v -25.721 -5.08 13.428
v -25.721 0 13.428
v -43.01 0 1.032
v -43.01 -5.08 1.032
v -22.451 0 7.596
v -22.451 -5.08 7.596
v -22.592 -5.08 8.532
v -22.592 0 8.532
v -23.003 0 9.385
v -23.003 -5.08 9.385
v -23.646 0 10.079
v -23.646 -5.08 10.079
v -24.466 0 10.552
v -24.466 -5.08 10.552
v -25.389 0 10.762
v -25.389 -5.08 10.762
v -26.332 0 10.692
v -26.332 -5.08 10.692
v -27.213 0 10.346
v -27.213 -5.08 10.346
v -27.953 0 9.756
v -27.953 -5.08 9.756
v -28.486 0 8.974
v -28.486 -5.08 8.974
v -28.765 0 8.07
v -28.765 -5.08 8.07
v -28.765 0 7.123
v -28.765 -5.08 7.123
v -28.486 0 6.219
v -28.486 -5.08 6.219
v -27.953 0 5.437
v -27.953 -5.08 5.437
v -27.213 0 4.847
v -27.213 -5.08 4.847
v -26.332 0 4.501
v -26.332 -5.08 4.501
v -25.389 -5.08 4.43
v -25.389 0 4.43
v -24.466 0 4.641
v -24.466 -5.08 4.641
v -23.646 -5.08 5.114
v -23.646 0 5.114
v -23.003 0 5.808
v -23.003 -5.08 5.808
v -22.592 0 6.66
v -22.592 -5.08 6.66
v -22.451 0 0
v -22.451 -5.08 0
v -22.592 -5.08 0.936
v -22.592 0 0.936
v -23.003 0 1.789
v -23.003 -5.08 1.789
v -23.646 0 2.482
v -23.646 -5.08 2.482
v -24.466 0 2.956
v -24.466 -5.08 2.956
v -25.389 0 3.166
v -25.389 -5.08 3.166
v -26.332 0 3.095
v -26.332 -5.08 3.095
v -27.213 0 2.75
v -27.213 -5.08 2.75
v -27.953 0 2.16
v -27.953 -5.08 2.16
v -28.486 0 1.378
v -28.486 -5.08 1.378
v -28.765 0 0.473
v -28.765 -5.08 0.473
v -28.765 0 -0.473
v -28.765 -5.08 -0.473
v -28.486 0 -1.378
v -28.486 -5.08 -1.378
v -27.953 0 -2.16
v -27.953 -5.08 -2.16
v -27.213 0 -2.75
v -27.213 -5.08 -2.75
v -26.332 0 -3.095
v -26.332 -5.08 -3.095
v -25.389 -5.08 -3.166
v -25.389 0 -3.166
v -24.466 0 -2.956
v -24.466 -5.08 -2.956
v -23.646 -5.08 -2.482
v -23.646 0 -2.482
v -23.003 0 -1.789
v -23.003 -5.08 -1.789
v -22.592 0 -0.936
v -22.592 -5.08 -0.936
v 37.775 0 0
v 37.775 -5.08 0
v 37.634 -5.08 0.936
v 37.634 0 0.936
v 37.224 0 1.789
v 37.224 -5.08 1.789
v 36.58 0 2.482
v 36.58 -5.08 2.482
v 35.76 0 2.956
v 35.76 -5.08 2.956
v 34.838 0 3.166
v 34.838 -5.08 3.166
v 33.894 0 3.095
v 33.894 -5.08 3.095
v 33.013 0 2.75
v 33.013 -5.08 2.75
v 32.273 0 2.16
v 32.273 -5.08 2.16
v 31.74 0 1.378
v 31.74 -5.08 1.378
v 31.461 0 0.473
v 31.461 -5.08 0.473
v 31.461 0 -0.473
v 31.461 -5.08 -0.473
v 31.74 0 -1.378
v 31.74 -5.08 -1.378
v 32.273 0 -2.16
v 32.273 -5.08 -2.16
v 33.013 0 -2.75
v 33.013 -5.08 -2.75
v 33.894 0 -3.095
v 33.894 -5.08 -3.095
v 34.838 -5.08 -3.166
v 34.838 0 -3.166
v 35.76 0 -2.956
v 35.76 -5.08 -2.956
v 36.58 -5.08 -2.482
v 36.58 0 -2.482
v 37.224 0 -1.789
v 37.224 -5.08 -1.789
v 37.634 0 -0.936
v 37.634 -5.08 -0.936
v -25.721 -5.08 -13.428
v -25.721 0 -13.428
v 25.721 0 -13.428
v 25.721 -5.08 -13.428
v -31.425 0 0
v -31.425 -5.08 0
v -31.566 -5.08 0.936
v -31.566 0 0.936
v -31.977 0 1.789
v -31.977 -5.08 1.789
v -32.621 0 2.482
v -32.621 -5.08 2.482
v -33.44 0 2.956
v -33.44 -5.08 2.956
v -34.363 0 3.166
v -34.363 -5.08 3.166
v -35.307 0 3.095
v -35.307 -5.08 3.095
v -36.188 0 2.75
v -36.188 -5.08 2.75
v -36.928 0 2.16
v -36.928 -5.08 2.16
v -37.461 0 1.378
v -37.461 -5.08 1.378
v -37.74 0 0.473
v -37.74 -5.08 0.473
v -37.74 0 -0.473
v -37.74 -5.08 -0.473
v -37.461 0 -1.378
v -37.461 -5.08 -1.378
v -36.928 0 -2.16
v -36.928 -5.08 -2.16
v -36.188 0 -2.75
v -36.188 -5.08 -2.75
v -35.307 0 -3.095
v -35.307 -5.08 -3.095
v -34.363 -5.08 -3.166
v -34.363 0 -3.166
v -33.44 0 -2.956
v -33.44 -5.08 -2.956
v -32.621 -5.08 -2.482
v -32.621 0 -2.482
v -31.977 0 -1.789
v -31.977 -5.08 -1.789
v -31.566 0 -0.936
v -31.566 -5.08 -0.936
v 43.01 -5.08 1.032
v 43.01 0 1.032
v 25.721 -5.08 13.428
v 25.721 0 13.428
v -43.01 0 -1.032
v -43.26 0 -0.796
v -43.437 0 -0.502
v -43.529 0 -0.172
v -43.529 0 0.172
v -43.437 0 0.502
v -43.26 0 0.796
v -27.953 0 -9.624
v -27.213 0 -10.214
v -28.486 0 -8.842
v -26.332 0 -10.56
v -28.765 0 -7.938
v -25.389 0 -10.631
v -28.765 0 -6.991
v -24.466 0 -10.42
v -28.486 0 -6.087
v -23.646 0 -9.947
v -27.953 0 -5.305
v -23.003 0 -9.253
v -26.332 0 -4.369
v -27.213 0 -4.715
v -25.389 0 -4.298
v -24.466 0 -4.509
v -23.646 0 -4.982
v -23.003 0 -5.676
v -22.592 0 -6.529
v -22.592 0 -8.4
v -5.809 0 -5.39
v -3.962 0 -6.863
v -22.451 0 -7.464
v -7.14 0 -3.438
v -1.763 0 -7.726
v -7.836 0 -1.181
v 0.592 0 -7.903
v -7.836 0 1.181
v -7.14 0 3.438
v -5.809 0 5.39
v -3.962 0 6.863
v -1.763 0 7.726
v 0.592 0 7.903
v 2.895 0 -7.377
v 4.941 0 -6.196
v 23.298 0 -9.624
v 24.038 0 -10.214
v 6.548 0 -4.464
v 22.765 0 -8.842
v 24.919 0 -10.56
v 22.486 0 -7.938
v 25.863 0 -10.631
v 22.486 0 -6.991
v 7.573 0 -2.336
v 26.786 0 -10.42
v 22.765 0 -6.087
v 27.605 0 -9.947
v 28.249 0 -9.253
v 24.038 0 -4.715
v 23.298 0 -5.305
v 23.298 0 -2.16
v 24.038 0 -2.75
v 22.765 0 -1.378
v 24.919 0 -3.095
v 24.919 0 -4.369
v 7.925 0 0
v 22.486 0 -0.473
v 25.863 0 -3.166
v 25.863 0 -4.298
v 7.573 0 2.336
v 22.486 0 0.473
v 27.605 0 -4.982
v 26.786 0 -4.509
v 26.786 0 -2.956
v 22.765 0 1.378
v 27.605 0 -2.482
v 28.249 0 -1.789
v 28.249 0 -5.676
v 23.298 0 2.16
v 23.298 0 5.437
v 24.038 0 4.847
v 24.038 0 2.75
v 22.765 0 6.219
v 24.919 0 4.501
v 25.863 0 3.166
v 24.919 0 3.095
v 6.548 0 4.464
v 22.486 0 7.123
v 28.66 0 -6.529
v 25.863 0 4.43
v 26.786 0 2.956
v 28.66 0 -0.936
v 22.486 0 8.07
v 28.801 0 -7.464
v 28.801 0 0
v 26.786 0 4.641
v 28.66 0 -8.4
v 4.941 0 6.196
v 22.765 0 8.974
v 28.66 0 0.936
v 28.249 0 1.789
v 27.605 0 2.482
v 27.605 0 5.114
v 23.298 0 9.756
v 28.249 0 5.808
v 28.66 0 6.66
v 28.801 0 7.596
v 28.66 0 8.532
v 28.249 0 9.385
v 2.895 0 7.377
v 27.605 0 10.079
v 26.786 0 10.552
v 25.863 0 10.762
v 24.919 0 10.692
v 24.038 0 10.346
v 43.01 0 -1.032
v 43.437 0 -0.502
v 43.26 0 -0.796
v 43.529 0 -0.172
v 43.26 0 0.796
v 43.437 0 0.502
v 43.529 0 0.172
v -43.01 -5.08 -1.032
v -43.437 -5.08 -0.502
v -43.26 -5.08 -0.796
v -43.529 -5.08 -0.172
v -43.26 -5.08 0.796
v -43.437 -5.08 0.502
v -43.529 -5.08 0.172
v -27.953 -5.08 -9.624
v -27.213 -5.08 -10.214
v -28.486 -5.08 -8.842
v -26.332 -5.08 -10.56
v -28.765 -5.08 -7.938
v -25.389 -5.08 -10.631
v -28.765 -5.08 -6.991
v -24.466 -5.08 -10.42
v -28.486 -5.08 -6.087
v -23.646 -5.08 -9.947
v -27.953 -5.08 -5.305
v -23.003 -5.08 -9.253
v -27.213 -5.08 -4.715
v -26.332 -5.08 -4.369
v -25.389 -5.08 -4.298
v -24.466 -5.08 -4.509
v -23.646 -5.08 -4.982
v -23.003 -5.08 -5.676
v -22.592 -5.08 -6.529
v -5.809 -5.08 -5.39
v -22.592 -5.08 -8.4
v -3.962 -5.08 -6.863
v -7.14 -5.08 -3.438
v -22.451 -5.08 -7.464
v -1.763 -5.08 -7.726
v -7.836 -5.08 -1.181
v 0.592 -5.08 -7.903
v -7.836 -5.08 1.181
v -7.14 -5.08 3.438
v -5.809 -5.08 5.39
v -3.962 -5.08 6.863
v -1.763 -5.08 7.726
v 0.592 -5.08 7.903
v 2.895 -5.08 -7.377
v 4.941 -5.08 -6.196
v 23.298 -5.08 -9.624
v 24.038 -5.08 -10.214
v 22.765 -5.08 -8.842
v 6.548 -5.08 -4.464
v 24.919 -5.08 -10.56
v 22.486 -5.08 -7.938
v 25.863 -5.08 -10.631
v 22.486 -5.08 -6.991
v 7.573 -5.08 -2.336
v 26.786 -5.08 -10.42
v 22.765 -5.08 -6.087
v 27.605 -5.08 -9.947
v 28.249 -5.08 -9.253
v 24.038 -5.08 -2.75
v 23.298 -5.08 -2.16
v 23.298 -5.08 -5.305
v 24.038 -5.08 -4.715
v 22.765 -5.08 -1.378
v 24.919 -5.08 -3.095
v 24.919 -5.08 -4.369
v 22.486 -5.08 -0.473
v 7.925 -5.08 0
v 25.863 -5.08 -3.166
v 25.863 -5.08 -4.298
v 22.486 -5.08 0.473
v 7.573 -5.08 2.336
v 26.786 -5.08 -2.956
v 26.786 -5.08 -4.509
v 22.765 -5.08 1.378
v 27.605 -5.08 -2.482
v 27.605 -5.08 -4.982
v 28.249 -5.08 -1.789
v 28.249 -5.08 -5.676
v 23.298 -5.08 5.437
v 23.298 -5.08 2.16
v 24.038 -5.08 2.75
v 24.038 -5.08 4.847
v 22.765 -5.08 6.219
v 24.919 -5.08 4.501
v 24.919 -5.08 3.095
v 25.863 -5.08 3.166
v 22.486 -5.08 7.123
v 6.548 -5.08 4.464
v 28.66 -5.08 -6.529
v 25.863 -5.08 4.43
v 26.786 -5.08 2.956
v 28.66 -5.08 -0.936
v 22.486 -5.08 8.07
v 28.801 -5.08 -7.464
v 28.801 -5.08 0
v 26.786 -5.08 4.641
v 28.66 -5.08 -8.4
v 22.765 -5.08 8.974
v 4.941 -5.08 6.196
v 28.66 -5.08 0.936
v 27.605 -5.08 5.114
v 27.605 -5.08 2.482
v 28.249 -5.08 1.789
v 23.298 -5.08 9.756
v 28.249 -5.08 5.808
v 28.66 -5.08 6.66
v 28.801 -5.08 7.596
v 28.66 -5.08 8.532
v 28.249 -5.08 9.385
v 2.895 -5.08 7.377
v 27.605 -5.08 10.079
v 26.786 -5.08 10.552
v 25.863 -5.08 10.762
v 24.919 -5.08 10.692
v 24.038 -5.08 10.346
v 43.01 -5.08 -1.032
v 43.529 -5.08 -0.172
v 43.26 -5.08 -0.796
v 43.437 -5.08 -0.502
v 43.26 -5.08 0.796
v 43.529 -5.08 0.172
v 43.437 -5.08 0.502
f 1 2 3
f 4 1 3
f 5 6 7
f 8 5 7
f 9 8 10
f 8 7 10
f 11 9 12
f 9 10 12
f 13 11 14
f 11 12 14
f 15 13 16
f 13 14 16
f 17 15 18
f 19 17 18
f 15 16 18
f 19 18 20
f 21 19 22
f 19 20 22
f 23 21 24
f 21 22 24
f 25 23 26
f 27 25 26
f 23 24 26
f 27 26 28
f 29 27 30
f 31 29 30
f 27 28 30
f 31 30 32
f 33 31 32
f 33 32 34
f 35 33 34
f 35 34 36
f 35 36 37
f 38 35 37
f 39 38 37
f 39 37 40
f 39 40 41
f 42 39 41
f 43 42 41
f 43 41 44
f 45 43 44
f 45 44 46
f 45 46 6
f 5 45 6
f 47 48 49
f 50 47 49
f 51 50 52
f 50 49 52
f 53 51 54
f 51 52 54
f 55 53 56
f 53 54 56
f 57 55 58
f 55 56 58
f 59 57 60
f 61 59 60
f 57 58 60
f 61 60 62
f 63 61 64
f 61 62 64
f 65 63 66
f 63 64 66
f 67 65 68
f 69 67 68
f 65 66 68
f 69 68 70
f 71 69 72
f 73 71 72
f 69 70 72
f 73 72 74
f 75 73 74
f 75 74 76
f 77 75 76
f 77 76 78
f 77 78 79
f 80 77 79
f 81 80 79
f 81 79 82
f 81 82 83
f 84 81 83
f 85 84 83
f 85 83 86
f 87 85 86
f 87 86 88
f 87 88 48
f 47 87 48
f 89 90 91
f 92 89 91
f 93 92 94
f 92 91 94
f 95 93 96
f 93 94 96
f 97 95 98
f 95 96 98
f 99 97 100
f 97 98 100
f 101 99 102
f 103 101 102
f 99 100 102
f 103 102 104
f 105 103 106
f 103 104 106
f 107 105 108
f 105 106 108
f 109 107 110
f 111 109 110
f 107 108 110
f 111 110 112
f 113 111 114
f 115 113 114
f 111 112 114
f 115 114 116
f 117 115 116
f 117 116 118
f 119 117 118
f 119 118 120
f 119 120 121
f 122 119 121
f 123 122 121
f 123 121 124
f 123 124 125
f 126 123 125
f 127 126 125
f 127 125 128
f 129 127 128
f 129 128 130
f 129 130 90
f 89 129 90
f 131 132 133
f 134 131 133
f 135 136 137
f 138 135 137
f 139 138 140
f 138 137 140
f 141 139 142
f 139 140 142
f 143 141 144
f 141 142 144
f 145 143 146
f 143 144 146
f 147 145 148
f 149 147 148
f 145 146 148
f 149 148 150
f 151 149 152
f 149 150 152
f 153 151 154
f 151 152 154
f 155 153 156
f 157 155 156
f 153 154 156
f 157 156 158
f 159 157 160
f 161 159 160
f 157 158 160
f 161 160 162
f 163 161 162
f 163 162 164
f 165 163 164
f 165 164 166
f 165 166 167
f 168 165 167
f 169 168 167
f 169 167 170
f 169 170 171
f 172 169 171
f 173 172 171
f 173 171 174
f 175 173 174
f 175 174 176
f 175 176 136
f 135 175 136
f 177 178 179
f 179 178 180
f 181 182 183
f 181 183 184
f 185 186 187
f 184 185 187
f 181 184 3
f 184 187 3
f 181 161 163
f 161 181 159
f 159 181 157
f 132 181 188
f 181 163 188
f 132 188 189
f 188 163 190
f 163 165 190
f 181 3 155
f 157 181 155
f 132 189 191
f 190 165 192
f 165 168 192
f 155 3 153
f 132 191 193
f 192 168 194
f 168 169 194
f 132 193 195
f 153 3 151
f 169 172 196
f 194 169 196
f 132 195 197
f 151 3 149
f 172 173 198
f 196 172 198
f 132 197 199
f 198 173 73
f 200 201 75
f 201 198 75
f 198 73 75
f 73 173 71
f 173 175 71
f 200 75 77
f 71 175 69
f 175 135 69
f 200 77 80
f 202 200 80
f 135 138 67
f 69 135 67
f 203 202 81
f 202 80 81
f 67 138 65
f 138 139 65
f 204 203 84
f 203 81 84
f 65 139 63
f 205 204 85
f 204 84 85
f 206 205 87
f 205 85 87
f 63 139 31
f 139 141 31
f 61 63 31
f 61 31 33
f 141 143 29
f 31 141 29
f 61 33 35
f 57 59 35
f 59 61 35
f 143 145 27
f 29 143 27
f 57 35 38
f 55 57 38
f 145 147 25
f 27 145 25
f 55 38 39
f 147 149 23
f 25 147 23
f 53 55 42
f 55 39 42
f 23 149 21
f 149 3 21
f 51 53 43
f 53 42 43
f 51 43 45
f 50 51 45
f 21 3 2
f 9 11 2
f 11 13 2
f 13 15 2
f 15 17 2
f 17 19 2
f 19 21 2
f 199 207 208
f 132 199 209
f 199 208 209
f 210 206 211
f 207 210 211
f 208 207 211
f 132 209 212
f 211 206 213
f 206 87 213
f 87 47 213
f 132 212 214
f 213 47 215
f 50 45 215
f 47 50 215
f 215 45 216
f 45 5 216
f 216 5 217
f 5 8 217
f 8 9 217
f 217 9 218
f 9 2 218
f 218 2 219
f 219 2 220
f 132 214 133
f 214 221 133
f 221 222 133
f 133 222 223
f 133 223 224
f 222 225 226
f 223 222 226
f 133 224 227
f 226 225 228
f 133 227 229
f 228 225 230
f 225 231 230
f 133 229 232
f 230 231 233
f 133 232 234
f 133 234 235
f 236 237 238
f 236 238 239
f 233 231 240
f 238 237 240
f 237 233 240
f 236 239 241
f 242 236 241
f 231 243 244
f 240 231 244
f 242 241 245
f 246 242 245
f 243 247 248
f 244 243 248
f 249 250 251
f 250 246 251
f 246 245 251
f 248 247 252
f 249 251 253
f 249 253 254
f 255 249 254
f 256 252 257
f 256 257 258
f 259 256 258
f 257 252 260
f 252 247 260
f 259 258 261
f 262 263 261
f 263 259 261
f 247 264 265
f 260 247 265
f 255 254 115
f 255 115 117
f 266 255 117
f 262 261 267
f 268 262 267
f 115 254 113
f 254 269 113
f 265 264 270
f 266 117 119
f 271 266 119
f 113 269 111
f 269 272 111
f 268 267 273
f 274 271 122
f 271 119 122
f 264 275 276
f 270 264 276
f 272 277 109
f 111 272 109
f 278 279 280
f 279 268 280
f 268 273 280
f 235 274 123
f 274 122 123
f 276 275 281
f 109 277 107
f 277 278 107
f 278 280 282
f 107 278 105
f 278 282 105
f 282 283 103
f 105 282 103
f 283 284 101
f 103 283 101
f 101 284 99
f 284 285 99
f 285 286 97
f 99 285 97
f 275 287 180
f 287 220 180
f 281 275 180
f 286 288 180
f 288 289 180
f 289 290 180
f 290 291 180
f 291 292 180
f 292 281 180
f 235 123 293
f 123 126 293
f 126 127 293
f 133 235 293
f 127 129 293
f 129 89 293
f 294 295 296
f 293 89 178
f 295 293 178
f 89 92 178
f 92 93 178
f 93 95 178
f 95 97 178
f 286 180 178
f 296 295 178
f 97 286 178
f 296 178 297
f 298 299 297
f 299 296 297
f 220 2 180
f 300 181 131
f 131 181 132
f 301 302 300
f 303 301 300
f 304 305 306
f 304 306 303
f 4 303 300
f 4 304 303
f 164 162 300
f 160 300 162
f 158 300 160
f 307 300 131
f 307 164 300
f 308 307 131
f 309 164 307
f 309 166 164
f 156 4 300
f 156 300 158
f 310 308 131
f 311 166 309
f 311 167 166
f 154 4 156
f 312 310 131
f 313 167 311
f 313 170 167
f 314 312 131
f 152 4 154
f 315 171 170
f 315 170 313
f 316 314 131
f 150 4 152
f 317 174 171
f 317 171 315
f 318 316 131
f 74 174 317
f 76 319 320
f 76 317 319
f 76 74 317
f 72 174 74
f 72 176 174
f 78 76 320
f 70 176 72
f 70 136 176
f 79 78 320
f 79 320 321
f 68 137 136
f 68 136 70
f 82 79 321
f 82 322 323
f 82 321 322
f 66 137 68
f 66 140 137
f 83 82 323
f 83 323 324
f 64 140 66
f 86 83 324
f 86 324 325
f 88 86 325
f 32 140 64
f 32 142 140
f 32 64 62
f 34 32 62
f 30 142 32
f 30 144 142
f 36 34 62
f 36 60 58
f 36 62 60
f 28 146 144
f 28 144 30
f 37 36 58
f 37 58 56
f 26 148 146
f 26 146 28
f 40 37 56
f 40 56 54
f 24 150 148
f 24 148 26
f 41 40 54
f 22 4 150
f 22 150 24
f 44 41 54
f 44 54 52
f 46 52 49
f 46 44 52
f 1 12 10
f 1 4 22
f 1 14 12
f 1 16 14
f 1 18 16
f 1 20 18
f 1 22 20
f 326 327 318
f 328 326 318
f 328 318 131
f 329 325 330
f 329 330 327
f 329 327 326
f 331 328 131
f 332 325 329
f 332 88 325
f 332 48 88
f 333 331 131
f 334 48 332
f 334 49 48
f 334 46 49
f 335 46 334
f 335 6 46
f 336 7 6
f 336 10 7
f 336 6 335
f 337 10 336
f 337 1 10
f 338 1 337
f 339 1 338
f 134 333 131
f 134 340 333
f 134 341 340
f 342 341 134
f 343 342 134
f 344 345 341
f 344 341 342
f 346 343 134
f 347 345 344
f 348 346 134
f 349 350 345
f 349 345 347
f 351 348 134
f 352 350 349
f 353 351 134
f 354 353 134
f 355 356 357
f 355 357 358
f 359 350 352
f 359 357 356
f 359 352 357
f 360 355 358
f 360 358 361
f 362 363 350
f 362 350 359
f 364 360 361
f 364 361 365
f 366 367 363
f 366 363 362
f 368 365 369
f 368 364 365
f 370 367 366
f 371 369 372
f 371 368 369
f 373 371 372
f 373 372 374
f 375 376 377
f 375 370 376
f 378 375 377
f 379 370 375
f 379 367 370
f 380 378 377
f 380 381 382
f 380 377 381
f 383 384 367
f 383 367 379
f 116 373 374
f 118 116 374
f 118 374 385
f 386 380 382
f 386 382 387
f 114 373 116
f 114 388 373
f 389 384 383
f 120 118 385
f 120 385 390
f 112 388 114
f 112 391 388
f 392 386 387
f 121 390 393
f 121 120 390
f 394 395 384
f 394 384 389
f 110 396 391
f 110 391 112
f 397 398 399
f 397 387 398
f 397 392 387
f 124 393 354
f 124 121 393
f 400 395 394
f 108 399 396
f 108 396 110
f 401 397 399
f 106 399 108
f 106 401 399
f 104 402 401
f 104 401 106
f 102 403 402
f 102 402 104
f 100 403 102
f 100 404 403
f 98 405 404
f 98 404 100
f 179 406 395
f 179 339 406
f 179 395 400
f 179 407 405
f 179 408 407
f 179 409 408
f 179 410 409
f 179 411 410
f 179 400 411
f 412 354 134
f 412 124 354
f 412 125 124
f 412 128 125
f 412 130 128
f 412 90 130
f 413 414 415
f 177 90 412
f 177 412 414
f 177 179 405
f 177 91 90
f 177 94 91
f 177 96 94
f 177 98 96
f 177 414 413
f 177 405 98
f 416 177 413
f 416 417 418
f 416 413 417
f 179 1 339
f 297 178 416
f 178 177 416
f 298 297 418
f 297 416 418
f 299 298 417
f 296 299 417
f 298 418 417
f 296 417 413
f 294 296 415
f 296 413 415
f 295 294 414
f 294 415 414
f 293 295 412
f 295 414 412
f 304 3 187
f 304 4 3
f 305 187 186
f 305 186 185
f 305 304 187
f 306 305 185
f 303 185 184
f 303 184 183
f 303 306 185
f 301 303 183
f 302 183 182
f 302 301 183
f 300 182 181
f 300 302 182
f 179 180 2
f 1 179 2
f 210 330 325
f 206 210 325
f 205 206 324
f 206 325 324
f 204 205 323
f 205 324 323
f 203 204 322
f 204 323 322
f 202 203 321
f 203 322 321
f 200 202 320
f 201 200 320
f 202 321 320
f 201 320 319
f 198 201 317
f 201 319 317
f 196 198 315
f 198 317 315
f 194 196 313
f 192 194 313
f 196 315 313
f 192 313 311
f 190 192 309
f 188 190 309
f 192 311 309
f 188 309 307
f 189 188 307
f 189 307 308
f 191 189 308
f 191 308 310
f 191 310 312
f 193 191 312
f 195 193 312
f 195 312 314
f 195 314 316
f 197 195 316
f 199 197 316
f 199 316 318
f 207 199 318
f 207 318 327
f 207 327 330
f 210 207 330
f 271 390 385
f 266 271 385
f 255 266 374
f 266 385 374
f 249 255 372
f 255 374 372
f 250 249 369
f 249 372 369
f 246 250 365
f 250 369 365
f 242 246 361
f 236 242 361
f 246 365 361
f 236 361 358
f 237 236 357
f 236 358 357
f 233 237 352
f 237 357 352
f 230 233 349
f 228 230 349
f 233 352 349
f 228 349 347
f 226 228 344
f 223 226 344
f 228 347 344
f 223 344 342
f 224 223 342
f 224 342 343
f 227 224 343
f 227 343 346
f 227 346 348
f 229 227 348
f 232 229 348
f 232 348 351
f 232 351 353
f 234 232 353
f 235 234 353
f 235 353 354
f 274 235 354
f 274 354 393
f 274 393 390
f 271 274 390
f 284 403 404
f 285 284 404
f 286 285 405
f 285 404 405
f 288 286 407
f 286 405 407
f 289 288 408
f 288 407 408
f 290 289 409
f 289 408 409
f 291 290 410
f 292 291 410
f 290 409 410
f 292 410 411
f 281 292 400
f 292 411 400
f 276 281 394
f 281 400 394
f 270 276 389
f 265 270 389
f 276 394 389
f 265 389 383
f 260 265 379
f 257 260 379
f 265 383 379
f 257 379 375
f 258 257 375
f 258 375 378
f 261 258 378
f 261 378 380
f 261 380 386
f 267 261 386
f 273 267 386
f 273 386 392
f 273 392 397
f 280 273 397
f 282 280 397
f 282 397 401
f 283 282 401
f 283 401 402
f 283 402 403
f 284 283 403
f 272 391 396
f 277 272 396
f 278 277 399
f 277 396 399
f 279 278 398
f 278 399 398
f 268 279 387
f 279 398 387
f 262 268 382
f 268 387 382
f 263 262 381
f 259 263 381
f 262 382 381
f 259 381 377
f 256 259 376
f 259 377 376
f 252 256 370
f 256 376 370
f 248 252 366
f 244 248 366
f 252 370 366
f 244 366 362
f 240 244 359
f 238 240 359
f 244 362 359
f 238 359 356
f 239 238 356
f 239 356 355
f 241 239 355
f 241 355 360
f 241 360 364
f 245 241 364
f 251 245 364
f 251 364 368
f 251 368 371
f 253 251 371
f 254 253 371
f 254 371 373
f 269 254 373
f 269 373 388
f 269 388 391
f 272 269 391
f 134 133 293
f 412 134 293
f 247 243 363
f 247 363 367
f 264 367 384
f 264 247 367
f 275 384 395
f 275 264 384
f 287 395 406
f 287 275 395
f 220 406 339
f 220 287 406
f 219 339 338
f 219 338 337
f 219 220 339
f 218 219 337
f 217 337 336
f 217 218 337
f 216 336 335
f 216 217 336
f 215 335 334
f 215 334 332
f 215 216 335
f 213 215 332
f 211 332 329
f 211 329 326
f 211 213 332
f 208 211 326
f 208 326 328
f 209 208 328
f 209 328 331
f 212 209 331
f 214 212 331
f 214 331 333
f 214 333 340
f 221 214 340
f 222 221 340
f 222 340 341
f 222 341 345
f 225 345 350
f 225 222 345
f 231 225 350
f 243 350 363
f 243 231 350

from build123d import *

# Parameters (mm, degrees)
F0_R     = 7.9248
F1_DEPTH = 5.08
F2_R     = 1.27
F3_R     = 3.175
F4_DEPTH = 25.4


with BuildPart() as f1:
    # F0 (on Front) → F1 (new body)
    with BuildSketch(Plane.XZ):
        Polygon((-25.72123, 13.428098), (-44.45, 0), (-25.72123, -13.428098), (25.72123, -13.428098), (44.45, 0), (25.72123, 13.428098), align=None)
        Circle(F0_R, mode=Mode.SUBTRACT)
    extrude(amount=F1_DEPTH)

    # F2
    f2_edges = [f1.edges().sort_by_distance(p)[0] for p in [
        (44.45, -2.54, 0),
        (-44.45, -2.54, 0),
    ]]
    fillet(f2_edges, radius=F2_R)

    # F3 (on face) → F4 (cut)
    with BuildSketch(Plane.XZ.offset(5.08)):
        with Locations((-25.625831, 7.596325)):
            Circle(F3_R)
        with Locations((-25.625831, 0)):
            Circle(F3_R)
        with Locations((-25.625831, -7.464381)):
            Circle(F3_R)
        with Locations((-34.600362, 0)):
            Circle(F3_R)
        with Locations((25.625831, 0)):
            Circle(F3_R)
        with Locations((25.625831, 7.596325)):
            Circle(F3_R)
        with Locations((34.600362, 0)):
            Circle(F3_R)
        with Locations((25.625831, -7.464381)):
            Circle(F3_R)
    extrude(amount=-F4_DEPTH, mode=Mode.SUBTRACT)


solid = f1.part
